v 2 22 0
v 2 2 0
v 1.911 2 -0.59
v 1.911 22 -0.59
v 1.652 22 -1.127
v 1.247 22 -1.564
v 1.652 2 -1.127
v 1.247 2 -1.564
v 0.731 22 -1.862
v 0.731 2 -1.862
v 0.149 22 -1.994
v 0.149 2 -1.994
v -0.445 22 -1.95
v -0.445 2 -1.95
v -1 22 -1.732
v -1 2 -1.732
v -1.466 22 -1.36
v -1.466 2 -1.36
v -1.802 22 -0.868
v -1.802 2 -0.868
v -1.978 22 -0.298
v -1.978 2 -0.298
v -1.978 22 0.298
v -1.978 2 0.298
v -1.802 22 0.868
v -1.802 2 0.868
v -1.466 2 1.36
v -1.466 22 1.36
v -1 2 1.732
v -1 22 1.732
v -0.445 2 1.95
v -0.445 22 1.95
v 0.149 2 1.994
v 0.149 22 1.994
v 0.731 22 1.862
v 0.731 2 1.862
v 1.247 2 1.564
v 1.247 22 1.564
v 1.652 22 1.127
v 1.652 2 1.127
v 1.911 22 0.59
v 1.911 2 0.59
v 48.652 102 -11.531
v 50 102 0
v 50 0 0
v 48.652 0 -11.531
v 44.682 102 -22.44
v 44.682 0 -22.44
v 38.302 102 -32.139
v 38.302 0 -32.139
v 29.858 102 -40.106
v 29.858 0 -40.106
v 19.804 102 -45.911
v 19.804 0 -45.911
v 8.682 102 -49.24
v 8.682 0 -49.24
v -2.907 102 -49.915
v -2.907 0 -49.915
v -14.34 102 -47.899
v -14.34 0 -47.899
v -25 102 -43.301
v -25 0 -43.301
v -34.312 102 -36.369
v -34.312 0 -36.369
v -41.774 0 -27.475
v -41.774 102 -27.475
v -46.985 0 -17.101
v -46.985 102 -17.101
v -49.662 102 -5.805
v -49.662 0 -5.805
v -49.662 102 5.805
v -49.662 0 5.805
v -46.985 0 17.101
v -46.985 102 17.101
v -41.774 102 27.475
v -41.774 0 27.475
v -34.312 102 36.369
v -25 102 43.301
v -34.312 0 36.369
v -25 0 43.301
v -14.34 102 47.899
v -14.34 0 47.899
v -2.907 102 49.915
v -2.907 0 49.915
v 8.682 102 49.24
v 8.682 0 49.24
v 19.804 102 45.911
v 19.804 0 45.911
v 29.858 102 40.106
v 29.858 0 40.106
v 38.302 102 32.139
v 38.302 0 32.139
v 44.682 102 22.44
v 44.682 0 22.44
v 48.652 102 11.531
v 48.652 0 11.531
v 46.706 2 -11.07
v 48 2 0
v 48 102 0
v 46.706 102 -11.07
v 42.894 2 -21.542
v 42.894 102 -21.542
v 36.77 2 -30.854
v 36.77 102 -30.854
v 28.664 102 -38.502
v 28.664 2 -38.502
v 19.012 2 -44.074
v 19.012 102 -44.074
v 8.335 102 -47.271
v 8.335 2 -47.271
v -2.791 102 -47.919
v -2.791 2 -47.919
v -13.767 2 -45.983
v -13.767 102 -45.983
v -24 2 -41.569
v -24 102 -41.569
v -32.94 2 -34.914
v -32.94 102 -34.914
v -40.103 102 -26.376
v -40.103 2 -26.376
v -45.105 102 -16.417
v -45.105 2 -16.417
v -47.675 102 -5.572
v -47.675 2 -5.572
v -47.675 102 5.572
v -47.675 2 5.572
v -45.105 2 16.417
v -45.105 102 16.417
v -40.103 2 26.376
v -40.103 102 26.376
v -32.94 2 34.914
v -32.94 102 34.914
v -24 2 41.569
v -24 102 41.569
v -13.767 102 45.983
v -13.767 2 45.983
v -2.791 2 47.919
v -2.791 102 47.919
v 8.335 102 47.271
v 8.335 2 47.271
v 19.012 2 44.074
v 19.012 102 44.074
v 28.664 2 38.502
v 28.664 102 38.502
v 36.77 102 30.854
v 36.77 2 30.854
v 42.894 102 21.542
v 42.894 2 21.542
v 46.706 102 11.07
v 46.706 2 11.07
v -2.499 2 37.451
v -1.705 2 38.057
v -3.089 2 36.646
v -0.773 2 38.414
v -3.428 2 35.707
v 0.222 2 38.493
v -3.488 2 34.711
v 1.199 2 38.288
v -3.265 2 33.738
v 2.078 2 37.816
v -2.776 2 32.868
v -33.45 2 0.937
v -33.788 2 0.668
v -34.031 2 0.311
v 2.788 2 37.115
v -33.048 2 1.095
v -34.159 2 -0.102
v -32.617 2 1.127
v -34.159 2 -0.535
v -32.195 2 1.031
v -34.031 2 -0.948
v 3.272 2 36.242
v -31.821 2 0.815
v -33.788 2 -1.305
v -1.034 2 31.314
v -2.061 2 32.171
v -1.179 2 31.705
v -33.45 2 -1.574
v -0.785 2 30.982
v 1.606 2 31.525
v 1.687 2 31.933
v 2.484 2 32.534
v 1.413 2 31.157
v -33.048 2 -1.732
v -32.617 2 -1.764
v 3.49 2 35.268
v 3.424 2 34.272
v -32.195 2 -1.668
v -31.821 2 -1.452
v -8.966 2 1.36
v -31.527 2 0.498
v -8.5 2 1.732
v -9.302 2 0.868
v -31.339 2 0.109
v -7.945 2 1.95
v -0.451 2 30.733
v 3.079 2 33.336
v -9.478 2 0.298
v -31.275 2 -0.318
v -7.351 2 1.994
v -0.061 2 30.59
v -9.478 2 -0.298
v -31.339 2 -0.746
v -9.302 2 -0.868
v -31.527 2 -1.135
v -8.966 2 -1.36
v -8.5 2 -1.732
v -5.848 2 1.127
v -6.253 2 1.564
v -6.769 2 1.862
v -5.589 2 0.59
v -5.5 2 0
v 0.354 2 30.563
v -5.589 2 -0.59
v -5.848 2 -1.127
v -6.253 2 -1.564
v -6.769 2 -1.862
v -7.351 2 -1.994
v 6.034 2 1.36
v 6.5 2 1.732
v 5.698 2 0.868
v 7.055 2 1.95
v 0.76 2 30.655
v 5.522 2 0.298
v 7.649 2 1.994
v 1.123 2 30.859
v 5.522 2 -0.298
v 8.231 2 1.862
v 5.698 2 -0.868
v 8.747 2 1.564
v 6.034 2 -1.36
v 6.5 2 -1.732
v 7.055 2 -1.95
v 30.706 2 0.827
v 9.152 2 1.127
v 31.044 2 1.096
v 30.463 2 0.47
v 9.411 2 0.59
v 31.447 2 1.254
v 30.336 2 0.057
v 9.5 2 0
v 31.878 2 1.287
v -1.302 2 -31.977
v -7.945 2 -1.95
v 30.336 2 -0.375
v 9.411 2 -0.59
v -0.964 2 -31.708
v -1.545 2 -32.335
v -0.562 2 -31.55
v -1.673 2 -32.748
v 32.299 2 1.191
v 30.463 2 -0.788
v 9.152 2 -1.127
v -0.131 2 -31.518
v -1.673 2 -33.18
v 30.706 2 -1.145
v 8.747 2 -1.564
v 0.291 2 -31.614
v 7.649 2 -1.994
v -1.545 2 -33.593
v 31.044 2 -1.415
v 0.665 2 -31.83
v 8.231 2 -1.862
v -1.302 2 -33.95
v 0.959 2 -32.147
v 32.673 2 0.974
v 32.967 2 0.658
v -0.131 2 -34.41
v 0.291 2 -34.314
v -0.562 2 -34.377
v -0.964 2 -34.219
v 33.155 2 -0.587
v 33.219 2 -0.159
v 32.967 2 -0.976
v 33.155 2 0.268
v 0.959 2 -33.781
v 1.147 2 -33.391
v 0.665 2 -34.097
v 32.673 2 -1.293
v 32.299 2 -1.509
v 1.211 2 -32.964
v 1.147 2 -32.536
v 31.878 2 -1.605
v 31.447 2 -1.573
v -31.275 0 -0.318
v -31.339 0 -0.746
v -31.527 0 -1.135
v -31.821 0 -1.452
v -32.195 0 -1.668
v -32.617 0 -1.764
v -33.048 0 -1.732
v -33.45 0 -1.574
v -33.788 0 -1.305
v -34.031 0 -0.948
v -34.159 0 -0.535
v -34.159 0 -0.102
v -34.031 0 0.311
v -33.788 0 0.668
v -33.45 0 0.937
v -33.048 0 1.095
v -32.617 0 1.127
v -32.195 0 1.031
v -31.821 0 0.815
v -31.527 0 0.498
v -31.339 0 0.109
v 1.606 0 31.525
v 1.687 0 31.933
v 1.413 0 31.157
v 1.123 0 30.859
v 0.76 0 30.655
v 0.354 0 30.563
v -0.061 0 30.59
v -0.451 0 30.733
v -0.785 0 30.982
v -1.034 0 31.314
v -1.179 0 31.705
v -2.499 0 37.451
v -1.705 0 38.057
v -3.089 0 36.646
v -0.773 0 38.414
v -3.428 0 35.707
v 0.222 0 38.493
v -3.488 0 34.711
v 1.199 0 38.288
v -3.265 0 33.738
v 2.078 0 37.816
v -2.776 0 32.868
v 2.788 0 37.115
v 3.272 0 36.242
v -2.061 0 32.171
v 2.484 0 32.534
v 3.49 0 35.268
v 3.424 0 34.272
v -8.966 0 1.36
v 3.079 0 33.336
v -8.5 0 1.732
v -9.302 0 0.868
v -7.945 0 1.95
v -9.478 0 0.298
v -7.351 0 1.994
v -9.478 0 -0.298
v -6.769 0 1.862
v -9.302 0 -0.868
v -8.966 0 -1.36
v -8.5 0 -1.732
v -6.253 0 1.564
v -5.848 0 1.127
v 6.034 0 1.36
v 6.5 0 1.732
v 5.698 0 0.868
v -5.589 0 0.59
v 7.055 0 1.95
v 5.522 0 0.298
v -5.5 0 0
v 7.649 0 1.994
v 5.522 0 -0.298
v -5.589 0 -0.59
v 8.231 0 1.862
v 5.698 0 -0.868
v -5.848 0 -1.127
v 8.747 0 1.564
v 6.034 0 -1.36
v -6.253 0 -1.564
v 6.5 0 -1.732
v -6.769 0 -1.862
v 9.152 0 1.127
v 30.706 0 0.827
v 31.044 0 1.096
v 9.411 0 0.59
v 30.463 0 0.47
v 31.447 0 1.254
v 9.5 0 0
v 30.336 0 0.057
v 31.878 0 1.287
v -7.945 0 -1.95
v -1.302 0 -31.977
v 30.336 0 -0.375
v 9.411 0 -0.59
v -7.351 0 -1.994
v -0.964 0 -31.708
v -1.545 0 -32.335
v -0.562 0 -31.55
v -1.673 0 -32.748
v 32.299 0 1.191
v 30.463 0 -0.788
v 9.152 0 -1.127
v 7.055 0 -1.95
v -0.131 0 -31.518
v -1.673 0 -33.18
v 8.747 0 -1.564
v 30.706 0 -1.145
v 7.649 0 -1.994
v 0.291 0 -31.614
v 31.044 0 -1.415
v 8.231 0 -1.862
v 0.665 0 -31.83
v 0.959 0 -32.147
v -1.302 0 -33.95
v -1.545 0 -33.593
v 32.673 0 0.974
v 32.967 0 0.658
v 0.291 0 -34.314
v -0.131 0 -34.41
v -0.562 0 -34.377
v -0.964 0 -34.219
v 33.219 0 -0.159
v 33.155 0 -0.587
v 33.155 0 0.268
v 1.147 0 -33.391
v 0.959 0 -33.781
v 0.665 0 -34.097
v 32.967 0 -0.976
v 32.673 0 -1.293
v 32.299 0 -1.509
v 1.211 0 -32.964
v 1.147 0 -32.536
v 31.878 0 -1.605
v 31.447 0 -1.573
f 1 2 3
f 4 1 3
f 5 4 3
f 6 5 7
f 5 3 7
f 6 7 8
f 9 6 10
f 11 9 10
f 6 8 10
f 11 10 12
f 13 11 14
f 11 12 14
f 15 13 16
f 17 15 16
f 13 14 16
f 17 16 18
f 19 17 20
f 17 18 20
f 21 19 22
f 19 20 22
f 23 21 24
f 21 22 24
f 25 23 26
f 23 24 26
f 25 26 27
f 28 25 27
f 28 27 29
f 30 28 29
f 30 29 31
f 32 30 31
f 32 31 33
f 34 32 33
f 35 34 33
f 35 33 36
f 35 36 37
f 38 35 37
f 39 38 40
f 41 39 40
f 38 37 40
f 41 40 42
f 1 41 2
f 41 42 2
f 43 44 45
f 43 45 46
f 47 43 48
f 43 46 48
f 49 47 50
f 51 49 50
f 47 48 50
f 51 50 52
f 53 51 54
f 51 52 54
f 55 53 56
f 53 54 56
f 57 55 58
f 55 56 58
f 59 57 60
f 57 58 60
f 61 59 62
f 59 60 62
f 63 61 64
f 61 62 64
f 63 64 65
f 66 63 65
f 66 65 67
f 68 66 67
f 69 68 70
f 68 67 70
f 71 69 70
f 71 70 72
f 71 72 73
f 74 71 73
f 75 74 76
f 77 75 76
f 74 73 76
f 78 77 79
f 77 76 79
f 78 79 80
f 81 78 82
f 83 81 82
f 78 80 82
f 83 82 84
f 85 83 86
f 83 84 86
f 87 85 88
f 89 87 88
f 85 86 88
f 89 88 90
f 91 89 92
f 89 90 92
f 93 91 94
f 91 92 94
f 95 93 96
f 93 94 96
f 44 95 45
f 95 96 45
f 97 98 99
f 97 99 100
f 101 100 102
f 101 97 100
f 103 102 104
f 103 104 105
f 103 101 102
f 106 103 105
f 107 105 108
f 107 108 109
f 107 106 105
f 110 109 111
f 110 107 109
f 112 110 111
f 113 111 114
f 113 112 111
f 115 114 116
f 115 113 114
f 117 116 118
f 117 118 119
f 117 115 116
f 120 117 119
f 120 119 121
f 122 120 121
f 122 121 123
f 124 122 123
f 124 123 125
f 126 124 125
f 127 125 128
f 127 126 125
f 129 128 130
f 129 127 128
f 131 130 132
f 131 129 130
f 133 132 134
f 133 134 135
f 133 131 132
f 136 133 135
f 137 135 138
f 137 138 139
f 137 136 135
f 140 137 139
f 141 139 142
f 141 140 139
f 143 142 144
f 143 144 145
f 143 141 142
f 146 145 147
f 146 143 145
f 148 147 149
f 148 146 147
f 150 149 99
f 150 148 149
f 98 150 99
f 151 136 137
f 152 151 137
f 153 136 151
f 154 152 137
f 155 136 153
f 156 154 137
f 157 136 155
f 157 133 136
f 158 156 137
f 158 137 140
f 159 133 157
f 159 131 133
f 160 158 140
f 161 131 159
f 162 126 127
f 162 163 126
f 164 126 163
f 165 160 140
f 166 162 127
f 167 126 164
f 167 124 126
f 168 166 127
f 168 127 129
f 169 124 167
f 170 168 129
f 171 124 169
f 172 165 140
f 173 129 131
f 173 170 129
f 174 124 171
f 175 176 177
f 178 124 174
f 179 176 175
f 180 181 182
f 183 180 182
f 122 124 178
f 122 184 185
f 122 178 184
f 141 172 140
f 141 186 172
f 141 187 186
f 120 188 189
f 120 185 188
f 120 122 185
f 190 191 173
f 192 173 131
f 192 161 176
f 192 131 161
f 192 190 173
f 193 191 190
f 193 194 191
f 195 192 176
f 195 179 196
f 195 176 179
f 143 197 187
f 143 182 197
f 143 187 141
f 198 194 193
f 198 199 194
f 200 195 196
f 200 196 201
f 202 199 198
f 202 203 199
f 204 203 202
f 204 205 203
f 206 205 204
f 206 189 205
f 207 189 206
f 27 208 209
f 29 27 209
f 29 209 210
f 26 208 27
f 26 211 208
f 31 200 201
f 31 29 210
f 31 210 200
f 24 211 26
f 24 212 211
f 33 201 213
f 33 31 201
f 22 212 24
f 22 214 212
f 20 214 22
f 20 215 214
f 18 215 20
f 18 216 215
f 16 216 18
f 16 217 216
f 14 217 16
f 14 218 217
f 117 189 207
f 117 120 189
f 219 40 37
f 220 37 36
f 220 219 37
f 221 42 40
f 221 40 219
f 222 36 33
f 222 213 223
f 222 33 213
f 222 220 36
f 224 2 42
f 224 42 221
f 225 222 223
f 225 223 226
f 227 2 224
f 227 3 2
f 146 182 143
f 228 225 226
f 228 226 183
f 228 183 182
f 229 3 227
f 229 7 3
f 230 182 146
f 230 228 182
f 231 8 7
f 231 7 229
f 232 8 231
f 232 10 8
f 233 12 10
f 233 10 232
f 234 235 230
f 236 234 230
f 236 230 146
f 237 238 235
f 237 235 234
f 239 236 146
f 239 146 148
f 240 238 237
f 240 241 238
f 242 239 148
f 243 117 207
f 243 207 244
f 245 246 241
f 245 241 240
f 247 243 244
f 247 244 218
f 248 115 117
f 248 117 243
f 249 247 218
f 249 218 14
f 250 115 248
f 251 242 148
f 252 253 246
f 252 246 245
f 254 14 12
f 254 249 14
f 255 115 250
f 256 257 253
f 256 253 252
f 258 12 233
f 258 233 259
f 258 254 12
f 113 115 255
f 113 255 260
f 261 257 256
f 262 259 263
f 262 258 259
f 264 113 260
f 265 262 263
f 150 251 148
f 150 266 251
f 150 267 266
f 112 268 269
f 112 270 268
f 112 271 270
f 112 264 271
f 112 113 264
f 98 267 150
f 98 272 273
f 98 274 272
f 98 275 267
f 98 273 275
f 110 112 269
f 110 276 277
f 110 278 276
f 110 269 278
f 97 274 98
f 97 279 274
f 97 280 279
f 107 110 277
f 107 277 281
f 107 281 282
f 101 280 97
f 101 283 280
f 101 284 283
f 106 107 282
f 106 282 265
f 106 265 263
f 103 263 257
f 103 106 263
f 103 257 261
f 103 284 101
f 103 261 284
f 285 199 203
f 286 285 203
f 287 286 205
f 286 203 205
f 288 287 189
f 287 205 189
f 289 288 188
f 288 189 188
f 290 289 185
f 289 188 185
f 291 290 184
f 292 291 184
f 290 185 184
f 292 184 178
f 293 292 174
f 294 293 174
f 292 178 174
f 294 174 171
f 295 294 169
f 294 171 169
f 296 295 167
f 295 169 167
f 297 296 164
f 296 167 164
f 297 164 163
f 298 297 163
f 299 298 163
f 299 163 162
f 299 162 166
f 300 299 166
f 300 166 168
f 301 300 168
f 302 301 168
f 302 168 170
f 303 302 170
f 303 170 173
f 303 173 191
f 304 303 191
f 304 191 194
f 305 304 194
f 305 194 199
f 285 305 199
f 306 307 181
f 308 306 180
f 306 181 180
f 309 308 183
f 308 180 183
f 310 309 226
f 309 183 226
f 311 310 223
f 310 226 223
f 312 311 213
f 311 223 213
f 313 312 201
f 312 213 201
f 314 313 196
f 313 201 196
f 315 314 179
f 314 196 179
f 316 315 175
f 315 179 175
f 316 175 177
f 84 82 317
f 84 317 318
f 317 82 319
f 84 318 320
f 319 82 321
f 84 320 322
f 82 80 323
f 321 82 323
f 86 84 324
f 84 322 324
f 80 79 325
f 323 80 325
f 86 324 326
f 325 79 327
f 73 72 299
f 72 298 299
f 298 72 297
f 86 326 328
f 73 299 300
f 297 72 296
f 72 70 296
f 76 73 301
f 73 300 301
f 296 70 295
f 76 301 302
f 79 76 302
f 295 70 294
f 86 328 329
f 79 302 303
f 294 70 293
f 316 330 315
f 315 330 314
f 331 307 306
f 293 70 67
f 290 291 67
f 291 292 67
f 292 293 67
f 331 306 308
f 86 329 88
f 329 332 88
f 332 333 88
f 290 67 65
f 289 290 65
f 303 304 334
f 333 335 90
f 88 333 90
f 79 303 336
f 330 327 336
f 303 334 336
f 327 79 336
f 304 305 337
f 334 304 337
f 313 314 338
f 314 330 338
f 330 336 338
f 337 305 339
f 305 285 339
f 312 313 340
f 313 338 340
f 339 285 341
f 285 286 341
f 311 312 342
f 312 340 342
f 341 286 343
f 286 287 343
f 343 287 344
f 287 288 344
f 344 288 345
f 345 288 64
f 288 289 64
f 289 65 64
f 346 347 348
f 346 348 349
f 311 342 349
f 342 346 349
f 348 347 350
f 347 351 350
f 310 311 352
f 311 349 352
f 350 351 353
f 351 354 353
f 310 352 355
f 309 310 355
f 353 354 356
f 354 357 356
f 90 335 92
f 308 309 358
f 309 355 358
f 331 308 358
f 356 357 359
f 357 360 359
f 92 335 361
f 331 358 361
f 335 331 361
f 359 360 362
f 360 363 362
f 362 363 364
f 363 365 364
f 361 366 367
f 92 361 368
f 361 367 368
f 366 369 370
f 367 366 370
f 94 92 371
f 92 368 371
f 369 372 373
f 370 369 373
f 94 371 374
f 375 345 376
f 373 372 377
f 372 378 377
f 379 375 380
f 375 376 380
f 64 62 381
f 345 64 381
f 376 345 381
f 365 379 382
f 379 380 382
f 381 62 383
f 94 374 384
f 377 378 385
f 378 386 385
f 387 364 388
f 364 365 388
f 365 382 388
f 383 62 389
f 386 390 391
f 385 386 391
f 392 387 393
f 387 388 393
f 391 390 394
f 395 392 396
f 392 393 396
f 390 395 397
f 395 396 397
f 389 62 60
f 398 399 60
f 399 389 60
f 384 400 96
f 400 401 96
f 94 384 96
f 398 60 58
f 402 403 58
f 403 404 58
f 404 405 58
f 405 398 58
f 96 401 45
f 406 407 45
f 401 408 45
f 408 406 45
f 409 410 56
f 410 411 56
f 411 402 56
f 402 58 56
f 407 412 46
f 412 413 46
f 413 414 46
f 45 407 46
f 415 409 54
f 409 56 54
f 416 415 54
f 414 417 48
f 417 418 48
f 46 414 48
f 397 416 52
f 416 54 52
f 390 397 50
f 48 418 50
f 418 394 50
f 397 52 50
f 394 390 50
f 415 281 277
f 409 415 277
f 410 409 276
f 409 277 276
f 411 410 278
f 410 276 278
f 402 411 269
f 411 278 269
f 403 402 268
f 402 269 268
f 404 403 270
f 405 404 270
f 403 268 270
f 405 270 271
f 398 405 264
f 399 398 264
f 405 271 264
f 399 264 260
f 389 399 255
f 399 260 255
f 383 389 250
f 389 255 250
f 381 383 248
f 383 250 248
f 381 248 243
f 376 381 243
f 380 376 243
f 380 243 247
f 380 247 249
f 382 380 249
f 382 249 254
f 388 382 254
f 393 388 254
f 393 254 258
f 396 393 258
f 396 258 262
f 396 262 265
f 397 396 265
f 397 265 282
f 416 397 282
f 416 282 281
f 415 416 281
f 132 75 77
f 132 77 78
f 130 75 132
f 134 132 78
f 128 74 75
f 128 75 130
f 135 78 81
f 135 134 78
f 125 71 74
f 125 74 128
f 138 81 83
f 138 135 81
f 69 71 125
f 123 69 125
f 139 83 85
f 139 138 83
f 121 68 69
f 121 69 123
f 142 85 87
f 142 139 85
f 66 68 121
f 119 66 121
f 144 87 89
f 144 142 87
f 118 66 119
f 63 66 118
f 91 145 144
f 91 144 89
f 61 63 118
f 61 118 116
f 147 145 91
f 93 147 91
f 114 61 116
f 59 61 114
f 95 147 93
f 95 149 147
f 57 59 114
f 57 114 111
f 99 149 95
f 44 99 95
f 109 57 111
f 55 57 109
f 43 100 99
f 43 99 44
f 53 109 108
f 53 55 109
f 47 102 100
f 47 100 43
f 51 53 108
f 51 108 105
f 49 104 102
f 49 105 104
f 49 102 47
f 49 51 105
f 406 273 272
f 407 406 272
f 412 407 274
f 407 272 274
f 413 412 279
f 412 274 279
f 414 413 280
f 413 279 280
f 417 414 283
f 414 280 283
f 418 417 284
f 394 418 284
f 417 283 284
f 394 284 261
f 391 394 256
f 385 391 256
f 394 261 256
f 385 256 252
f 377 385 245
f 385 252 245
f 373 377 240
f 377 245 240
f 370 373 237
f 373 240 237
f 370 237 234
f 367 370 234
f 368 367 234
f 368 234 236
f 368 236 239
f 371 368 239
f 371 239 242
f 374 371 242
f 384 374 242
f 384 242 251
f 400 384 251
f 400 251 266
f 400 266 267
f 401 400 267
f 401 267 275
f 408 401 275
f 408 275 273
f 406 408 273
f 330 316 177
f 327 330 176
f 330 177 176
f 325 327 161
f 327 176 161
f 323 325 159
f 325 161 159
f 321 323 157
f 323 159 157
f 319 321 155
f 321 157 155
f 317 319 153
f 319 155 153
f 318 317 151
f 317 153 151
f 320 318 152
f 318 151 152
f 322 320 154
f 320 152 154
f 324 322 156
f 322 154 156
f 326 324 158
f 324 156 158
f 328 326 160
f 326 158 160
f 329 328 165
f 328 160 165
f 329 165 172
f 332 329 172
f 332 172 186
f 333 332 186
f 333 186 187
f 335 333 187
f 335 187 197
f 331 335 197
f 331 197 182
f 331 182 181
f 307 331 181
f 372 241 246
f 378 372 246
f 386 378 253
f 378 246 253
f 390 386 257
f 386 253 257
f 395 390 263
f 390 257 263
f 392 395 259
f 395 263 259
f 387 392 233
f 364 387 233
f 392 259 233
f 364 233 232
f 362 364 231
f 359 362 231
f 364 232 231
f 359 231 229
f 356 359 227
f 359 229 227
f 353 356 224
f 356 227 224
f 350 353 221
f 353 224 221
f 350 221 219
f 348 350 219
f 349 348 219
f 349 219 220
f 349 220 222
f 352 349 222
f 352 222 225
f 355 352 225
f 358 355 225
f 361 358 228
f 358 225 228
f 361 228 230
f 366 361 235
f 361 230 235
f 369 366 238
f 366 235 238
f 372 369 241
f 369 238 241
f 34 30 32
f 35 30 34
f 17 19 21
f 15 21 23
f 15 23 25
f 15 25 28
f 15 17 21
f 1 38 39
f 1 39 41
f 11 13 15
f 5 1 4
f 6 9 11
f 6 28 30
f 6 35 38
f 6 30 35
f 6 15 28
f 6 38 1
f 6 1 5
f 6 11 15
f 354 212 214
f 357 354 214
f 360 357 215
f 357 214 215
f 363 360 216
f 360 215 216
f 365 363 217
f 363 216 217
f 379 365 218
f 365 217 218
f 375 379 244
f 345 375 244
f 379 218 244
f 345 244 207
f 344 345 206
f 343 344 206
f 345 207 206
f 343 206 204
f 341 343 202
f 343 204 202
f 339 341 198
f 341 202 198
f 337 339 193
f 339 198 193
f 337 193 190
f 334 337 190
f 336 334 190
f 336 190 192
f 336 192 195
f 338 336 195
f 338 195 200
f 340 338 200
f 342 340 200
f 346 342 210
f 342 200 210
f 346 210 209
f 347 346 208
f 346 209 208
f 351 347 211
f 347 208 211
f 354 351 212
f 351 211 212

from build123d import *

# Parameters (mm, degrees)
SKETCH1_R           = 50
BOSS_EXTRUDE1_DEPTH = 2
SKETCH4_R           = 2
CUT_EXTRUDE1_DEPTH  = 2
SKETCH5_R           = 50
SKETCH5_R_2         = 48
BOSS_EXTRUDE2_DEPTH = 100
SKETCH6_R           = 2
BOSS_EXTRUDE3_DEPTH = 20
SKETCH7_R           = 3.5
CUT_EXTRUDE2_DEPTH  = 5
SKETCH8_R           = 1.45
CUT_EXTRUDE3_DEPTH  = 10


with BuildPart() as part:
    # Sketch1 → Boss-Extrude1 (new body)
    with BuildSketch(Plane(origin=(0, 0, 0), x_dir=(1, 0, 0), z_dir=(0, 1, 0))):
        Circle(SKETCH1_R)
    extrude(amount=BOSS_EXTRUDE1_DEPTH)

    # Sketch4 → Cut-Extrude1 (cut)
    with BuildSketch(Plane(origin=(0, 2, 0), x_dir=(1, 0, 0), z_dir=(0, 1, 0))):
        with Locations((-7.5, 0)):
            Circle(SKETCH4_R)
        with Locations((7.5, 0)):
            Circle(SKETCH4_R)
    extrude(amount=-CUT_EXTRUDE1_DEPTH, mode=Mode.SUBTRACT)

    # Sketch5 → Boss-Extrude2 (add)
    with BuildSketch(Plane(origin=(0, 2, 0), x_dir=(1, 0, 0), z_dir=(0, 1, 0))):
        Circle(SKETCH5_R)
        Circle(SKETCH5_R_2, mode=Mode.SUBTRACT)
    extrude(amount=BOSS_EXTRUDE2_DEPTH)

    # Sketch6 → Boss-Extrude3 (add)
    with BuildSketch(Plane(origin=(0, 2, 0), x_dir=(1, 0, 0), z_dir=(0, 1, 0))):
        Circle(SKETCH6_R)
    extrude(amount=BOSS_EXTRUDE3_DEPTH)

    # Sketch7 → Cut-Extrude2 (cut)
    with BuildSketch(Plane(origin=(0, 2, 0), x_dir=(1, 0, 0), z_dir=(0, 1, 0))):
        with Locations((0, -35)):
            Circle(SKETCH7_R)
    extrude(amount=-CUT_EXTRUDE2_DEPTH, mode=Mode.SUBTRACT)

    # Sketch8 → Cut-Extrude3 (cut)
    with BuildSketch(Plane(origin=(0, 2, 0), x_dir=(1, 0, 0), z_dir=(0, 1, 0))):
        with Locations((0.238867715, -32.008273773)):
            Circle(SKETCH8_R)
        with Locations((-32.724876918, 0.318490286)):
            Circle(SKETCH8_R)
        with Locations((-0.238867715, 32.963744632)):
            Circle(SKETCH8_R)
        with Locations((31.769406059, 0.159245143)):
            Circle(SKETCH8_R)
    extrude(amount=-CUT_EXTRUDE3_DEPTH, mode=Mode.SUBTRACT)


solid = part.part
